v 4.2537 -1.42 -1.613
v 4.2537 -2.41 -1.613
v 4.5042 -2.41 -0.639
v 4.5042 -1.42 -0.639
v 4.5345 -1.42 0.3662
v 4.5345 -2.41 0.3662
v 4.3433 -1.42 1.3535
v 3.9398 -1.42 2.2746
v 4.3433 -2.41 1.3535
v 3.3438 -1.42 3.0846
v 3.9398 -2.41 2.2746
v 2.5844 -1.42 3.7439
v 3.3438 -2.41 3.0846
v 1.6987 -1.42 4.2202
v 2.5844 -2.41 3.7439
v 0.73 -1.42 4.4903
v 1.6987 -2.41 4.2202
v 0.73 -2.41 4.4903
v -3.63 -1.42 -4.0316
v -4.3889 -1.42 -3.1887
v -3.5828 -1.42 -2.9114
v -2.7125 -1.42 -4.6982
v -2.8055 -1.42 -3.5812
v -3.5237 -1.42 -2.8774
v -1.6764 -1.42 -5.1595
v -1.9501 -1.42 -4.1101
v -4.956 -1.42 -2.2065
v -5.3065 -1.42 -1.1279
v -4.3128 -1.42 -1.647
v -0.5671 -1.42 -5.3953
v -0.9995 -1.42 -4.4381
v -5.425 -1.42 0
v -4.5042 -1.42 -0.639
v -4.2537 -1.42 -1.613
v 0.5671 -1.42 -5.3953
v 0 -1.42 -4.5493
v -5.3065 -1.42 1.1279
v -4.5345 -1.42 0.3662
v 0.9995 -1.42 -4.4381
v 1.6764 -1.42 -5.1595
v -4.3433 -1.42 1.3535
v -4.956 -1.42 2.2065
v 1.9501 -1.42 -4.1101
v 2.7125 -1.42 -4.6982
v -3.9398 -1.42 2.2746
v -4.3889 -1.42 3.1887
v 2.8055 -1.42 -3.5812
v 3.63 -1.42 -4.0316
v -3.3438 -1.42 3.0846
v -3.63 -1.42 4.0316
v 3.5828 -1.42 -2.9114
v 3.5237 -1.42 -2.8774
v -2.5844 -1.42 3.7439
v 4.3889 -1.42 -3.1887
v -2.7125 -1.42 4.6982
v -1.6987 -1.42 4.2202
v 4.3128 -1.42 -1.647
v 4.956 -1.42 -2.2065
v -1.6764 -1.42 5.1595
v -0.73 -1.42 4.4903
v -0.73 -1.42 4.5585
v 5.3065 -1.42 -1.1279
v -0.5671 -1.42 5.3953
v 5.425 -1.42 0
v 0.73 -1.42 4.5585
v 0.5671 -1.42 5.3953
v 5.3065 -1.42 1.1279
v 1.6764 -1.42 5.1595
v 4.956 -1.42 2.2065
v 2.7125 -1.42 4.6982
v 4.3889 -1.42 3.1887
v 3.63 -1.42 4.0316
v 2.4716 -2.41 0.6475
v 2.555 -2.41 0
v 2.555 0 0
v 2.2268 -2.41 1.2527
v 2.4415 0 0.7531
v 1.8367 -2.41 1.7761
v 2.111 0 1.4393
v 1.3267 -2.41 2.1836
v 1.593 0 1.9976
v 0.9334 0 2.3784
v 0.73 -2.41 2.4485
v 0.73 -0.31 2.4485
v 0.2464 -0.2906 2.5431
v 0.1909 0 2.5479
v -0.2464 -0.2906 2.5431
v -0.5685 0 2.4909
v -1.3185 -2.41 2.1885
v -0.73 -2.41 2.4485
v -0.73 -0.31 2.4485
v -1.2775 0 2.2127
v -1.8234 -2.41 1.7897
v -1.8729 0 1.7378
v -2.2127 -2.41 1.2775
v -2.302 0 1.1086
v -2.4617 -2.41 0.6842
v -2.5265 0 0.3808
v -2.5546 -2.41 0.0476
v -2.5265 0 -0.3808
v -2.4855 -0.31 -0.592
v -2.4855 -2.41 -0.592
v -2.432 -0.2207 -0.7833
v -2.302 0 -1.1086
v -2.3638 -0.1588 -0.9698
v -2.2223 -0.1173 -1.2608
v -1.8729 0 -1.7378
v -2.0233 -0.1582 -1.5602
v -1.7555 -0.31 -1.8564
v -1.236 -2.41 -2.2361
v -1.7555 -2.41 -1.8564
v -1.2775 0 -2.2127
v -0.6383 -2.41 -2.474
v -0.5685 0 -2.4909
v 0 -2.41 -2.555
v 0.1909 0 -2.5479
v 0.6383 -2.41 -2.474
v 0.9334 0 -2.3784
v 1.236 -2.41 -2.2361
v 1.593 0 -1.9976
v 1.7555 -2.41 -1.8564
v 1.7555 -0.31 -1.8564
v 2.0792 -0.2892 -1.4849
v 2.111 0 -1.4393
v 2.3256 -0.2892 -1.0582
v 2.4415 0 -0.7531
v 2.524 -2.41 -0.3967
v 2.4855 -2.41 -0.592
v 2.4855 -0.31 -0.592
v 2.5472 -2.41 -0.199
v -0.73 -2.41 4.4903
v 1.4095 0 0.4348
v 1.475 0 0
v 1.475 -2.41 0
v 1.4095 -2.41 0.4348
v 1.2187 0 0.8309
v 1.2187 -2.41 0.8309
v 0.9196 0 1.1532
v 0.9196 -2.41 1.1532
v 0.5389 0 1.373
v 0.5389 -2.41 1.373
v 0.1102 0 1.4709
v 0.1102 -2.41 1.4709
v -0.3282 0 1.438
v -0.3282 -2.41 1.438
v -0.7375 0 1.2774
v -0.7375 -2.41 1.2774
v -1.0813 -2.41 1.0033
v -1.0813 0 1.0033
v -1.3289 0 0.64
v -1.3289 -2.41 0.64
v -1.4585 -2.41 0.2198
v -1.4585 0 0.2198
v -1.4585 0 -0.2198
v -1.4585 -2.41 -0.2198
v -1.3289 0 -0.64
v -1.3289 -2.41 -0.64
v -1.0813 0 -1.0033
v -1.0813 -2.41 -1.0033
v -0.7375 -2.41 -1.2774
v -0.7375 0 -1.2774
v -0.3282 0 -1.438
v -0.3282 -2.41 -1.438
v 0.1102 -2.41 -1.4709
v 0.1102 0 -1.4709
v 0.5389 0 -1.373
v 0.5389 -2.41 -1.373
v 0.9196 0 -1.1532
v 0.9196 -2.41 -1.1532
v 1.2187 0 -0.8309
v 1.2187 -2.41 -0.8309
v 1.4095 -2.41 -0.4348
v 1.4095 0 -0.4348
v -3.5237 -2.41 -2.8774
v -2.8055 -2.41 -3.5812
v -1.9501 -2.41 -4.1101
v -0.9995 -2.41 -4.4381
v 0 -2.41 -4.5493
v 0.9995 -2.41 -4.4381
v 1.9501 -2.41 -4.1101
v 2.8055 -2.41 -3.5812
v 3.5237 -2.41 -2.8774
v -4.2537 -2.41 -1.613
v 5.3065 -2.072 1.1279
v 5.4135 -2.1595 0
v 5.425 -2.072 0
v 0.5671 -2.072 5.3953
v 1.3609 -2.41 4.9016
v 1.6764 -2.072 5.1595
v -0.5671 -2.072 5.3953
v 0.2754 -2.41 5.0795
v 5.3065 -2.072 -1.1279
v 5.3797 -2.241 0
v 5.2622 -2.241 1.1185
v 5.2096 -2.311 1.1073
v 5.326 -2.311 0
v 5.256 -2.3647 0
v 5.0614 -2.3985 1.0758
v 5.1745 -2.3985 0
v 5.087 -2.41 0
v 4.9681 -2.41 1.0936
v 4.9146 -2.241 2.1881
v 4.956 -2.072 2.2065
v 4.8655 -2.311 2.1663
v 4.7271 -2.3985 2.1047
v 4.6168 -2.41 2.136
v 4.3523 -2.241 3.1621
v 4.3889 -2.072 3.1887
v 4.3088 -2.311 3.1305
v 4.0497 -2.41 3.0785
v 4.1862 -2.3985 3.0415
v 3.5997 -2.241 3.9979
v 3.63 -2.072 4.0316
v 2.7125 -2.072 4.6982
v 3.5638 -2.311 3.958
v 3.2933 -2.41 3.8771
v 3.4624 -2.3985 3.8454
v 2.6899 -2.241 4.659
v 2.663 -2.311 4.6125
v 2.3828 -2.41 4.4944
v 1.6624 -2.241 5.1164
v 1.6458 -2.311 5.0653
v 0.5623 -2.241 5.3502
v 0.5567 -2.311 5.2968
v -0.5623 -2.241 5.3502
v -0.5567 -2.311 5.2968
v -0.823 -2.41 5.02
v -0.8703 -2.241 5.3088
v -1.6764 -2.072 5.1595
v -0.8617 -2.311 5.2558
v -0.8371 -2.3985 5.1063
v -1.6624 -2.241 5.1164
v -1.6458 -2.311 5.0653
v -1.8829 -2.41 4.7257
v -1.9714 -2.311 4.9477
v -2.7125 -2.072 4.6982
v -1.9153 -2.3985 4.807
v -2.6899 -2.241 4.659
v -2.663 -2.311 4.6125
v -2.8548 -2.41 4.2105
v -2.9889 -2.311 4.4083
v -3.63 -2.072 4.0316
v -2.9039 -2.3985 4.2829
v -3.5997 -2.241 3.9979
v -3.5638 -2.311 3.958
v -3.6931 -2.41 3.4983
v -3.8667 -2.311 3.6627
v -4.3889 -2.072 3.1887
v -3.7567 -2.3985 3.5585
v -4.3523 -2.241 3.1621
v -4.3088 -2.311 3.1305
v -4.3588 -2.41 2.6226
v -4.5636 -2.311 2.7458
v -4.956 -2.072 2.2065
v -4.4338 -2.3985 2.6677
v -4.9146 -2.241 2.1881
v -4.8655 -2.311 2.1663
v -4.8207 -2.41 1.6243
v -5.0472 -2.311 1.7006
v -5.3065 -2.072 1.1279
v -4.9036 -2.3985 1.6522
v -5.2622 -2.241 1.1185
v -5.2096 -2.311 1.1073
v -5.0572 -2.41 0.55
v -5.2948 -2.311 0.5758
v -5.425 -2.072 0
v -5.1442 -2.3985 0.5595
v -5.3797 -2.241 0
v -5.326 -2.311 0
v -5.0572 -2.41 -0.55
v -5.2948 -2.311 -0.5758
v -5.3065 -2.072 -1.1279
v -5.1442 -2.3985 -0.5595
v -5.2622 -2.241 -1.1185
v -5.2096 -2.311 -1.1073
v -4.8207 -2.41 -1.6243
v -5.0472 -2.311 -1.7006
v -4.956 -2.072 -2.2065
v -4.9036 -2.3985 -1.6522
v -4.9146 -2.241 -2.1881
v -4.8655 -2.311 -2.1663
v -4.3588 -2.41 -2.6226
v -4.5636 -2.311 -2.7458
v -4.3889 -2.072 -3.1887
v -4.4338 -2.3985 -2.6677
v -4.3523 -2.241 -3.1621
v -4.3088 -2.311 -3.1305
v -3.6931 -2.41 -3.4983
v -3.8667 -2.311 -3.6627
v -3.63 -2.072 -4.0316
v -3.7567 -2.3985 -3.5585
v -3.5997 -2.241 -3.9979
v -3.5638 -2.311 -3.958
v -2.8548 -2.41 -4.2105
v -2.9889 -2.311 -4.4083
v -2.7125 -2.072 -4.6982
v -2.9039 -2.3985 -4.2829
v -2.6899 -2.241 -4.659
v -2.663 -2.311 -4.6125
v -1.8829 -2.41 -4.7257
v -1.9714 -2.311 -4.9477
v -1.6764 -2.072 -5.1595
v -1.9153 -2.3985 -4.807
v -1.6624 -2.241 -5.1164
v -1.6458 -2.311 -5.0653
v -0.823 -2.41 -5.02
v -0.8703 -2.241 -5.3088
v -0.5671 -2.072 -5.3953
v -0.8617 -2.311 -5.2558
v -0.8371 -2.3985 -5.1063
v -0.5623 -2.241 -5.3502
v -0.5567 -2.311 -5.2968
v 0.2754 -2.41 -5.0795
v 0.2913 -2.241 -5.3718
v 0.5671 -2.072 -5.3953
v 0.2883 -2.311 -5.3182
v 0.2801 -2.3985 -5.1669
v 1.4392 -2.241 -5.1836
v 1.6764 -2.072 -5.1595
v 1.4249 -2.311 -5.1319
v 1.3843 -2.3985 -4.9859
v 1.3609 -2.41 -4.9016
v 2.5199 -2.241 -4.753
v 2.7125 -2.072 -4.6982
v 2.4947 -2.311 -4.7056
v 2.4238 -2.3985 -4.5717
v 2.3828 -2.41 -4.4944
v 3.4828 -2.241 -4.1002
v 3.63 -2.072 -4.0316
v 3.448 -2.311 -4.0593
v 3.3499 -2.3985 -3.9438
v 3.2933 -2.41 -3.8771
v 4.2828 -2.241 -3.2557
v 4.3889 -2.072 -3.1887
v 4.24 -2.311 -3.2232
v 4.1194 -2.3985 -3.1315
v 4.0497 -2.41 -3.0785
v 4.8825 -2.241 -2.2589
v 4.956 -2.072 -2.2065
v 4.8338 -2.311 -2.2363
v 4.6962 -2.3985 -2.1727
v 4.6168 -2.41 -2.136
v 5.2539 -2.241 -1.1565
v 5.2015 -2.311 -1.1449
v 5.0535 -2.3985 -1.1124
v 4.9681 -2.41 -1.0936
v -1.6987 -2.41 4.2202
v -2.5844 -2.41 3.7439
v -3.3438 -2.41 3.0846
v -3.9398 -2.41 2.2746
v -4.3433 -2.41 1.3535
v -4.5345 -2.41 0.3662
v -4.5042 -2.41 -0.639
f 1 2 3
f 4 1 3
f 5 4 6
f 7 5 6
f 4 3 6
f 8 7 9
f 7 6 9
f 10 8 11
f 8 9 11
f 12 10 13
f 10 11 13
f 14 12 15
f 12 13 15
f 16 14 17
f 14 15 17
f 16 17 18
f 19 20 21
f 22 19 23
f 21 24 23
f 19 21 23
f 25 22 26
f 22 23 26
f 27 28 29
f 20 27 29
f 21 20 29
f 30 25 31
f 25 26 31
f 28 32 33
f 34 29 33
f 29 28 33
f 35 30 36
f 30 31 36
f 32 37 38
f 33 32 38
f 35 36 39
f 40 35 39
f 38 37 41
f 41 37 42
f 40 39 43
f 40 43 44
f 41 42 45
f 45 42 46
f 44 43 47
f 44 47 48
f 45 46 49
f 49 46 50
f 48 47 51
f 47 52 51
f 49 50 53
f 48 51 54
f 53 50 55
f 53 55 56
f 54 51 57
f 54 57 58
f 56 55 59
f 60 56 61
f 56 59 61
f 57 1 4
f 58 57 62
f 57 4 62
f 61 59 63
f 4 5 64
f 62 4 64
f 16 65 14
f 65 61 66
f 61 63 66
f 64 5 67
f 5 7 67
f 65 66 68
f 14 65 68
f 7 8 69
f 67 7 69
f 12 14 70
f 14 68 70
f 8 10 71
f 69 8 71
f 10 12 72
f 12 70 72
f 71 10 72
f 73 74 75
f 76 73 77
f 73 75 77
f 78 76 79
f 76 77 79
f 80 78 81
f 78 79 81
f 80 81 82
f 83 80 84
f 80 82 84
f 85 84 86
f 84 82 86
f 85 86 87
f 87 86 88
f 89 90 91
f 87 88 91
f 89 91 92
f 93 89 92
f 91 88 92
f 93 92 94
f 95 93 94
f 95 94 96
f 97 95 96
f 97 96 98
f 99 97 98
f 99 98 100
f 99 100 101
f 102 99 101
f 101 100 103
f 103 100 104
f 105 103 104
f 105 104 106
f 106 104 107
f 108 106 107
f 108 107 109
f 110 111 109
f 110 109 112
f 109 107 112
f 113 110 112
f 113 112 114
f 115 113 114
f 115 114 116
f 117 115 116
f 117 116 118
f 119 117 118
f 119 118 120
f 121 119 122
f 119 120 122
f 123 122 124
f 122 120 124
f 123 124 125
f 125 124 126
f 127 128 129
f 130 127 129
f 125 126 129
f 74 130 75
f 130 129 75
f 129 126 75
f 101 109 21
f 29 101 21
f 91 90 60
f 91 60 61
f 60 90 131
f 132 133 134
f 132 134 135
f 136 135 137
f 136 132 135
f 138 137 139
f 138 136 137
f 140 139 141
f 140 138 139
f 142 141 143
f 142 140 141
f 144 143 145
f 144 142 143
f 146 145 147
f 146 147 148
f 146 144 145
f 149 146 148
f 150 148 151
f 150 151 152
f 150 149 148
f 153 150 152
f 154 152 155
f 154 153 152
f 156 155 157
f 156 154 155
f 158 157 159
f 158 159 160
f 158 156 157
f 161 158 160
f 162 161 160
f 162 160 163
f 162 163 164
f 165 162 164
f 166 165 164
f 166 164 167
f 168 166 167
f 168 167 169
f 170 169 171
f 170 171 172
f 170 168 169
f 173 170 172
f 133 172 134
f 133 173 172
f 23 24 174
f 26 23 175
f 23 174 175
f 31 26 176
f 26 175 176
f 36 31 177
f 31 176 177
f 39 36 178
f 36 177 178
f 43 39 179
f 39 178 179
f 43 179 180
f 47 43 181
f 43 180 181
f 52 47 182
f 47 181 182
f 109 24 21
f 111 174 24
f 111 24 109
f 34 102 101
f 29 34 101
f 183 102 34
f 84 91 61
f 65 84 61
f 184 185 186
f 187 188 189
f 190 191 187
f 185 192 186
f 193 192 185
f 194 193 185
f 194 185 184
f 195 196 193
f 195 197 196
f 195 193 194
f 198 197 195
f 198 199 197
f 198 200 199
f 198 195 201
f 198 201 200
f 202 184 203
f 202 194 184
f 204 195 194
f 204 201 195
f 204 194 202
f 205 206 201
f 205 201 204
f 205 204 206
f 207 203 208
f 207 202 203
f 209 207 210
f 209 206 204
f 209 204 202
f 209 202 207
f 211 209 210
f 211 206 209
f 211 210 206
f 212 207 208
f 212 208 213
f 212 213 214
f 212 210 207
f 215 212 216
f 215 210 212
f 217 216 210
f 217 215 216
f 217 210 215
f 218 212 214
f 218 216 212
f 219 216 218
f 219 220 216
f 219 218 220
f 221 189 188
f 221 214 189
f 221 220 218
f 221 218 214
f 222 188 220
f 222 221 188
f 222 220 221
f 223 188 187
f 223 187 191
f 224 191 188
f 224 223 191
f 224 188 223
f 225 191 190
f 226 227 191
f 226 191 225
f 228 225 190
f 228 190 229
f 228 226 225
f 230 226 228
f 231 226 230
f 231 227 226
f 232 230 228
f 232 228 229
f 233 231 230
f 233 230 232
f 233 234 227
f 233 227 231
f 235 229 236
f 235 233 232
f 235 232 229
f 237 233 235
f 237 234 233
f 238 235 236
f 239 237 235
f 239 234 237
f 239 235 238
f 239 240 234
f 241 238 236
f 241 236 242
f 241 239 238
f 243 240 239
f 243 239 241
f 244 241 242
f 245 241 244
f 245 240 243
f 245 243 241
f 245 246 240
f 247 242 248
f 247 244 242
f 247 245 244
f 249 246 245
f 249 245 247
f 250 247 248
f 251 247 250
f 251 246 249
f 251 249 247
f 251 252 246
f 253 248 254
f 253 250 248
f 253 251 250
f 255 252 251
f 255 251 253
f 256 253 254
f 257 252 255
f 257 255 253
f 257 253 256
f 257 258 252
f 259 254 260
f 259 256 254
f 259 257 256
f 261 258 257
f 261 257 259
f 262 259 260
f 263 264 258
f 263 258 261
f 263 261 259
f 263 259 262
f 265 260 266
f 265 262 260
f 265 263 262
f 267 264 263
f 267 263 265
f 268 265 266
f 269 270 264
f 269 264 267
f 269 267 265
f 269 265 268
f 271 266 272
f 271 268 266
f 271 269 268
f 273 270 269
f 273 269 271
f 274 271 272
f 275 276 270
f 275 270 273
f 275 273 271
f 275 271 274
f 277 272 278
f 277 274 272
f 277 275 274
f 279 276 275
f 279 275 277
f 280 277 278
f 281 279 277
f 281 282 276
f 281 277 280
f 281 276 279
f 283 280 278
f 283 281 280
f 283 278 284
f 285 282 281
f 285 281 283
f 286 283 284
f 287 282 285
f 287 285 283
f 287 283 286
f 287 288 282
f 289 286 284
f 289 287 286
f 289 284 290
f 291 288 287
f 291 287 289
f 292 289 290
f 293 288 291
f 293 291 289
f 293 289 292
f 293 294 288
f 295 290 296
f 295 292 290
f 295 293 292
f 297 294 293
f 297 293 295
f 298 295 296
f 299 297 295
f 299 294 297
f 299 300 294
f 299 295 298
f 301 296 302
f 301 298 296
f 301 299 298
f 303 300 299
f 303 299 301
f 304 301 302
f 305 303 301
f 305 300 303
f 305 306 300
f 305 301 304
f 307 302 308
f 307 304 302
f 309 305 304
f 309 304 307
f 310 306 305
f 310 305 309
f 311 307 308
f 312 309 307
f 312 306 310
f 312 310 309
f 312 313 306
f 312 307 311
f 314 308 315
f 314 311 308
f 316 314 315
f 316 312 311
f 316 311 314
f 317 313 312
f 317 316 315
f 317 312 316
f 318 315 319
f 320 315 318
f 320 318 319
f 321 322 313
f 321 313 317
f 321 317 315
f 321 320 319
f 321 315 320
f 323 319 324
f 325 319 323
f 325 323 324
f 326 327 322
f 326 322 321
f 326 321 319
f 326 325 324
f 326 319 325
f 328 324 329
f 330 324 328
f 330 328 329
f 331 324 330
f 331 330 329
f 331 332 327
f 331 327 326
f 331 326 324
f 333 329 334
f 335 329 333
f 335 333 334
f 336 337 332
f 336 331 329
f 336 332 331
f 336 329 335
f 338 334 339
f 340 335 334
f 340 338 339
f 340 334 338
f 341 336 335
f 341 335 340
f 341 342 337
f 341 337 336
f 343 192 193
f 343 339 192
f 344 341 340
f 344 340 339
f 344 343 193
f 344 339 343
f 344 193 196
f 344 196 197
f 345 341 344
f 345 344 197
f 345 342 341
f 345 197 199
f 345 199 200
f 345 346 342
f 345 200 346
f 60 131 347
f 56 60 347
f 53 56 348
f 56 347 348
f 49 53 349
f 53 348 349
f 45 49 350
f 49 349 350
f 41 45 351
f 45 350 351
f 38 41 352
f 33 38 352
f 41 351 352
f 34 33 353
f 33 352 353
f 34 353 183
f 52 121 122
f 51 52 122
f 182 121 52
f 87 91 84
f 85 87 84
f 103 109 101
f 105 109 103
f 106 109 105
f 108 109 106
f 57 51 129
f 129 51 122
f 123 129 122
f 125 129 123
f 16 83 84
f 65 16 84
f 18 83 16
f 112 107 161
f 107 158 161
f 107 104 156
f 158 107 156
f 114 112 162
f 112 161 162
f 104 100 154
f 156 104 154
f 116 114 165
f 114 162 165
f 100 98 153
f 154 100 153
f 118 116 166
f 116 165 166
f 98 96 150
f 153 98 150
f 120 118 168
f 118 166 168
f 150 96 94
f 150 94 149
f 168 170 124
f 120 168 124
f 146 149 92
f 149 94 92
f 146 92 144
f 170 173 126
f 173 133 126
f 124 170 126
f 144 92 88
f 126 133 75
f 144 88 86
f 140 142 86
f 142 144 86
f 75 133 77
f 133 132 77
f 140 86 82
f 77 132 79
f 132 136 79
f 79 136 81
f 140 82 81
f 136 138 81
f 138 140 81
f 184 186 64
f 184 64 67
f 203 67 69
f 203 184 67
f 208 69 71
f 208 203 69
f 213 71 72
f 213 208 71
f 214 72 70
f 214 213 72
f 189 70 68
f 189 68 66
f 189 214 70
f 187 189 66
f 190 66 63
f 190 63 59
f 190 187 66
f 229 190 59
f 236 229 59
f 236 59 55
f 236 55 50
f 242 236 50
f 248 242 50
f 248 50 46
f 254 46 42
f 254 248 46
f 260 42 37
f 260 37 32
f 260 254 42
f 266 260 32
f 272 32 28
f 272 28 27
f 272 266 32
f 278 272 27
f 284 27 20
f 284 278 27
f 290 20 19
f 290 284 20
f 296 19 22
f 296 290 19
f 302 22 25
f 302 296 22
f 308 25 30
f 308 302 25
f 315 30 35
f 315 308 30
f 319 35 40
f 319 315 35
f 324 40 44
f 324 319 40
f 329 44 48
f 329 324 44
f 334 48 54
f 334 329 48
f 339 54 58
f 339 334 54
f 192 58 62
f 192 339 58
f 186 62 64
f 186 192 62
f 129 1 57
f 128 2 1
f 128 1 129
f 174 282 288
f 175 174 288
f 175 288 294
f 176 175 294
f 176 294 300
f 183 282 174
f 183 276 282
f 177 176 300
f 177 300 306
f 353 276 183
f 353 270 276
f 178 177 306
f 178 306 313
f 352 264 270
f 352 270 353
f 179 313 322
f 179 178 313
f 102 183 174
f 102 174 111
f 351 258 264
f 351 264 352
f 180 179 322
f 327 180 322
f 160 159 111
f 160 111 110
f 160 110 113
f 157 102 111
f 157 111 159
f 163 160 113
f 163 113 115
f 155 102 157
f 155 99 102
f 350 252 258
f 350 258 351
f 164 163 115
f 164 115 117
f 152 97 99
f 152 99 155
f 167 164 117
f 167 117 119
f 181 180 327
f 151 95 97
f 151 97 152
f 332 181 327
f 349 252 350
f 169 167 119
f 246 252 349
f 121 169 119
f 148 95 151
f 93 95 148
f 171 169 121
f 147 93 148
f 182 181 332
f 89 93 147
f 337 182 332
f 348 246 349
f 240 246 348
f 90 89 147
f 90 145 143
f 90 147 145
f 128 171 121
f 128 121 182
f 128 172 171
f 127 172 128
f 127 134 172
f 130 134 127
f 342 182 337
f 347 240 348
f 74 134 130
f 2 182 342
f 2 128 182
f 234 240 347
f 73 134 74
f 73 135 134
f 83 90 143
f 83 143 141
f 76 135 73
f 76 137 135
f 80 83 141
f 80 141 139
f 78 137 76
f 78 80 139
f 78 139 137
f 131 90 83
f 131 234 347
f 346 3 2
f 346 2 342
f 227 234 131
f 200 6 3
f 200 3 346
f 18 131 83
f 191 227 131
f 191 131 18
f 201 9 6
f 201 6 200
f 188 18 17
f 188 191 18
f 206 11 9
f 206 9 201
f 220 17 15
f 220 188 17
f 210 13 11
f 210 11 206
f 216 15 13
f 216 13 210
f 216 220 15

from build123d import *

# Parameters (mm, degrees)
F0_R      = 2.555
F0_R_2    = 1.475
F1_DEPTH  = 2.41
F2_W      = 1.46
F2_H      = 2.11
F3_DEPTH  = 2.1
F5_DEPTH  = 25
F7_DEPTH  = 25
F9_DEPTH  = 25
F10_R     = 5.425
F10_R_2   = 4.549258
F11_DEPTH = 0.99
F12_R     = 0.33799


with BuildPart() as f1:
    # F0 (on Front) → F1 (new body)
    with BuildSketch(Plane.XZ):
        Circle(F0_R)
        Circle(F0_R_2, mode=Mode.SUBTRACT)
    extrude(amount=F1_DEPTH)

    # F2 (on face) → F3 (join)
    with BuildSketch(Plane.XZ.offset(2.41)):
        with Locations((0, 3.503494)):
            Rectangle(F2_W, F2_H)
        Polygon((-3.582772, -2.911446), (-1.755458, -1.856446), (-2.485458, -0.592049), (-4.312772, -1.647049), align=None)
        Polygon((4.312772, -1.647049), (2.485458, -0.592049), (1.755458, -1.856446), (3.582772, -2.911446), align=None)
    extrude(amount=-F3_DEPTH)

    # F4 (on face) → F5 (cut)
    with BuildSketch(Plane(origin=(-0.365, 0, -0.632199), x_dir=(0.866025, 0, -0.5), z_dir=(-0.5, 0, -0.866025))):
        Polygon((4.558494, 1.42), (2.448494, 0.31), (3.479598, 0.083374), (4.896949, 0.210857), (4.896949, 2.56652), (4.714418, 2.478824), (4.714418, 1.641871), align=None)
    extrude(amount=-F5_DEPTH, mode=Mode.SUBTRACT)

    # F6 (on face) → F7 (cut)
    with BuildSketch(Plane(origin=(-0.73, 0, 0), x_dir=(0, -1, 0), z_dir=(-1, 0, 0))):
        Polygon((0.091005, 3.516779), (0.31, 2.448494), (1.42, 4.558494), (2.41, 4.741723), (0.190774, 5.01886), align=None)
    extrude(amount=-F7_DEPTH, mode=Mode.SUBTRACT)

    # F8 (on face) → F9 (cut)
    with BuildSketch(Plane(origin=(0.365, 0, -0.632199), x_dir=(0.866025, 0, 0.5), z_dir=(0.5, 0, -0.866025))):
        Polygon((-4.558494, 1.42), (-5.496076, 1.436378), (-4.840972, -0.092841), (-2.670947, -0.092841), (-2.448494, 0.31), align=None)
    extrude(amount=-F9_DEPTH, mode=Mode.SUBTRACT)

    # F10 (on face) → F11 (join)
    with BuildSketch(Plane.XZ.offset(2.41)):
        Circle(F10_R)
        Circle(F10_R_2, mode=Mode.SUBTRACT)
    extrude(amount=-F11_DEPTH)

    # F12
    f12_edges = [f1.edges().sort_by_distance(p)[0] for p in [
        (-5.425, -2.41, 0),
    ]]
    fillet(f12_edges, radius=F12_R)


solid = f1.part
